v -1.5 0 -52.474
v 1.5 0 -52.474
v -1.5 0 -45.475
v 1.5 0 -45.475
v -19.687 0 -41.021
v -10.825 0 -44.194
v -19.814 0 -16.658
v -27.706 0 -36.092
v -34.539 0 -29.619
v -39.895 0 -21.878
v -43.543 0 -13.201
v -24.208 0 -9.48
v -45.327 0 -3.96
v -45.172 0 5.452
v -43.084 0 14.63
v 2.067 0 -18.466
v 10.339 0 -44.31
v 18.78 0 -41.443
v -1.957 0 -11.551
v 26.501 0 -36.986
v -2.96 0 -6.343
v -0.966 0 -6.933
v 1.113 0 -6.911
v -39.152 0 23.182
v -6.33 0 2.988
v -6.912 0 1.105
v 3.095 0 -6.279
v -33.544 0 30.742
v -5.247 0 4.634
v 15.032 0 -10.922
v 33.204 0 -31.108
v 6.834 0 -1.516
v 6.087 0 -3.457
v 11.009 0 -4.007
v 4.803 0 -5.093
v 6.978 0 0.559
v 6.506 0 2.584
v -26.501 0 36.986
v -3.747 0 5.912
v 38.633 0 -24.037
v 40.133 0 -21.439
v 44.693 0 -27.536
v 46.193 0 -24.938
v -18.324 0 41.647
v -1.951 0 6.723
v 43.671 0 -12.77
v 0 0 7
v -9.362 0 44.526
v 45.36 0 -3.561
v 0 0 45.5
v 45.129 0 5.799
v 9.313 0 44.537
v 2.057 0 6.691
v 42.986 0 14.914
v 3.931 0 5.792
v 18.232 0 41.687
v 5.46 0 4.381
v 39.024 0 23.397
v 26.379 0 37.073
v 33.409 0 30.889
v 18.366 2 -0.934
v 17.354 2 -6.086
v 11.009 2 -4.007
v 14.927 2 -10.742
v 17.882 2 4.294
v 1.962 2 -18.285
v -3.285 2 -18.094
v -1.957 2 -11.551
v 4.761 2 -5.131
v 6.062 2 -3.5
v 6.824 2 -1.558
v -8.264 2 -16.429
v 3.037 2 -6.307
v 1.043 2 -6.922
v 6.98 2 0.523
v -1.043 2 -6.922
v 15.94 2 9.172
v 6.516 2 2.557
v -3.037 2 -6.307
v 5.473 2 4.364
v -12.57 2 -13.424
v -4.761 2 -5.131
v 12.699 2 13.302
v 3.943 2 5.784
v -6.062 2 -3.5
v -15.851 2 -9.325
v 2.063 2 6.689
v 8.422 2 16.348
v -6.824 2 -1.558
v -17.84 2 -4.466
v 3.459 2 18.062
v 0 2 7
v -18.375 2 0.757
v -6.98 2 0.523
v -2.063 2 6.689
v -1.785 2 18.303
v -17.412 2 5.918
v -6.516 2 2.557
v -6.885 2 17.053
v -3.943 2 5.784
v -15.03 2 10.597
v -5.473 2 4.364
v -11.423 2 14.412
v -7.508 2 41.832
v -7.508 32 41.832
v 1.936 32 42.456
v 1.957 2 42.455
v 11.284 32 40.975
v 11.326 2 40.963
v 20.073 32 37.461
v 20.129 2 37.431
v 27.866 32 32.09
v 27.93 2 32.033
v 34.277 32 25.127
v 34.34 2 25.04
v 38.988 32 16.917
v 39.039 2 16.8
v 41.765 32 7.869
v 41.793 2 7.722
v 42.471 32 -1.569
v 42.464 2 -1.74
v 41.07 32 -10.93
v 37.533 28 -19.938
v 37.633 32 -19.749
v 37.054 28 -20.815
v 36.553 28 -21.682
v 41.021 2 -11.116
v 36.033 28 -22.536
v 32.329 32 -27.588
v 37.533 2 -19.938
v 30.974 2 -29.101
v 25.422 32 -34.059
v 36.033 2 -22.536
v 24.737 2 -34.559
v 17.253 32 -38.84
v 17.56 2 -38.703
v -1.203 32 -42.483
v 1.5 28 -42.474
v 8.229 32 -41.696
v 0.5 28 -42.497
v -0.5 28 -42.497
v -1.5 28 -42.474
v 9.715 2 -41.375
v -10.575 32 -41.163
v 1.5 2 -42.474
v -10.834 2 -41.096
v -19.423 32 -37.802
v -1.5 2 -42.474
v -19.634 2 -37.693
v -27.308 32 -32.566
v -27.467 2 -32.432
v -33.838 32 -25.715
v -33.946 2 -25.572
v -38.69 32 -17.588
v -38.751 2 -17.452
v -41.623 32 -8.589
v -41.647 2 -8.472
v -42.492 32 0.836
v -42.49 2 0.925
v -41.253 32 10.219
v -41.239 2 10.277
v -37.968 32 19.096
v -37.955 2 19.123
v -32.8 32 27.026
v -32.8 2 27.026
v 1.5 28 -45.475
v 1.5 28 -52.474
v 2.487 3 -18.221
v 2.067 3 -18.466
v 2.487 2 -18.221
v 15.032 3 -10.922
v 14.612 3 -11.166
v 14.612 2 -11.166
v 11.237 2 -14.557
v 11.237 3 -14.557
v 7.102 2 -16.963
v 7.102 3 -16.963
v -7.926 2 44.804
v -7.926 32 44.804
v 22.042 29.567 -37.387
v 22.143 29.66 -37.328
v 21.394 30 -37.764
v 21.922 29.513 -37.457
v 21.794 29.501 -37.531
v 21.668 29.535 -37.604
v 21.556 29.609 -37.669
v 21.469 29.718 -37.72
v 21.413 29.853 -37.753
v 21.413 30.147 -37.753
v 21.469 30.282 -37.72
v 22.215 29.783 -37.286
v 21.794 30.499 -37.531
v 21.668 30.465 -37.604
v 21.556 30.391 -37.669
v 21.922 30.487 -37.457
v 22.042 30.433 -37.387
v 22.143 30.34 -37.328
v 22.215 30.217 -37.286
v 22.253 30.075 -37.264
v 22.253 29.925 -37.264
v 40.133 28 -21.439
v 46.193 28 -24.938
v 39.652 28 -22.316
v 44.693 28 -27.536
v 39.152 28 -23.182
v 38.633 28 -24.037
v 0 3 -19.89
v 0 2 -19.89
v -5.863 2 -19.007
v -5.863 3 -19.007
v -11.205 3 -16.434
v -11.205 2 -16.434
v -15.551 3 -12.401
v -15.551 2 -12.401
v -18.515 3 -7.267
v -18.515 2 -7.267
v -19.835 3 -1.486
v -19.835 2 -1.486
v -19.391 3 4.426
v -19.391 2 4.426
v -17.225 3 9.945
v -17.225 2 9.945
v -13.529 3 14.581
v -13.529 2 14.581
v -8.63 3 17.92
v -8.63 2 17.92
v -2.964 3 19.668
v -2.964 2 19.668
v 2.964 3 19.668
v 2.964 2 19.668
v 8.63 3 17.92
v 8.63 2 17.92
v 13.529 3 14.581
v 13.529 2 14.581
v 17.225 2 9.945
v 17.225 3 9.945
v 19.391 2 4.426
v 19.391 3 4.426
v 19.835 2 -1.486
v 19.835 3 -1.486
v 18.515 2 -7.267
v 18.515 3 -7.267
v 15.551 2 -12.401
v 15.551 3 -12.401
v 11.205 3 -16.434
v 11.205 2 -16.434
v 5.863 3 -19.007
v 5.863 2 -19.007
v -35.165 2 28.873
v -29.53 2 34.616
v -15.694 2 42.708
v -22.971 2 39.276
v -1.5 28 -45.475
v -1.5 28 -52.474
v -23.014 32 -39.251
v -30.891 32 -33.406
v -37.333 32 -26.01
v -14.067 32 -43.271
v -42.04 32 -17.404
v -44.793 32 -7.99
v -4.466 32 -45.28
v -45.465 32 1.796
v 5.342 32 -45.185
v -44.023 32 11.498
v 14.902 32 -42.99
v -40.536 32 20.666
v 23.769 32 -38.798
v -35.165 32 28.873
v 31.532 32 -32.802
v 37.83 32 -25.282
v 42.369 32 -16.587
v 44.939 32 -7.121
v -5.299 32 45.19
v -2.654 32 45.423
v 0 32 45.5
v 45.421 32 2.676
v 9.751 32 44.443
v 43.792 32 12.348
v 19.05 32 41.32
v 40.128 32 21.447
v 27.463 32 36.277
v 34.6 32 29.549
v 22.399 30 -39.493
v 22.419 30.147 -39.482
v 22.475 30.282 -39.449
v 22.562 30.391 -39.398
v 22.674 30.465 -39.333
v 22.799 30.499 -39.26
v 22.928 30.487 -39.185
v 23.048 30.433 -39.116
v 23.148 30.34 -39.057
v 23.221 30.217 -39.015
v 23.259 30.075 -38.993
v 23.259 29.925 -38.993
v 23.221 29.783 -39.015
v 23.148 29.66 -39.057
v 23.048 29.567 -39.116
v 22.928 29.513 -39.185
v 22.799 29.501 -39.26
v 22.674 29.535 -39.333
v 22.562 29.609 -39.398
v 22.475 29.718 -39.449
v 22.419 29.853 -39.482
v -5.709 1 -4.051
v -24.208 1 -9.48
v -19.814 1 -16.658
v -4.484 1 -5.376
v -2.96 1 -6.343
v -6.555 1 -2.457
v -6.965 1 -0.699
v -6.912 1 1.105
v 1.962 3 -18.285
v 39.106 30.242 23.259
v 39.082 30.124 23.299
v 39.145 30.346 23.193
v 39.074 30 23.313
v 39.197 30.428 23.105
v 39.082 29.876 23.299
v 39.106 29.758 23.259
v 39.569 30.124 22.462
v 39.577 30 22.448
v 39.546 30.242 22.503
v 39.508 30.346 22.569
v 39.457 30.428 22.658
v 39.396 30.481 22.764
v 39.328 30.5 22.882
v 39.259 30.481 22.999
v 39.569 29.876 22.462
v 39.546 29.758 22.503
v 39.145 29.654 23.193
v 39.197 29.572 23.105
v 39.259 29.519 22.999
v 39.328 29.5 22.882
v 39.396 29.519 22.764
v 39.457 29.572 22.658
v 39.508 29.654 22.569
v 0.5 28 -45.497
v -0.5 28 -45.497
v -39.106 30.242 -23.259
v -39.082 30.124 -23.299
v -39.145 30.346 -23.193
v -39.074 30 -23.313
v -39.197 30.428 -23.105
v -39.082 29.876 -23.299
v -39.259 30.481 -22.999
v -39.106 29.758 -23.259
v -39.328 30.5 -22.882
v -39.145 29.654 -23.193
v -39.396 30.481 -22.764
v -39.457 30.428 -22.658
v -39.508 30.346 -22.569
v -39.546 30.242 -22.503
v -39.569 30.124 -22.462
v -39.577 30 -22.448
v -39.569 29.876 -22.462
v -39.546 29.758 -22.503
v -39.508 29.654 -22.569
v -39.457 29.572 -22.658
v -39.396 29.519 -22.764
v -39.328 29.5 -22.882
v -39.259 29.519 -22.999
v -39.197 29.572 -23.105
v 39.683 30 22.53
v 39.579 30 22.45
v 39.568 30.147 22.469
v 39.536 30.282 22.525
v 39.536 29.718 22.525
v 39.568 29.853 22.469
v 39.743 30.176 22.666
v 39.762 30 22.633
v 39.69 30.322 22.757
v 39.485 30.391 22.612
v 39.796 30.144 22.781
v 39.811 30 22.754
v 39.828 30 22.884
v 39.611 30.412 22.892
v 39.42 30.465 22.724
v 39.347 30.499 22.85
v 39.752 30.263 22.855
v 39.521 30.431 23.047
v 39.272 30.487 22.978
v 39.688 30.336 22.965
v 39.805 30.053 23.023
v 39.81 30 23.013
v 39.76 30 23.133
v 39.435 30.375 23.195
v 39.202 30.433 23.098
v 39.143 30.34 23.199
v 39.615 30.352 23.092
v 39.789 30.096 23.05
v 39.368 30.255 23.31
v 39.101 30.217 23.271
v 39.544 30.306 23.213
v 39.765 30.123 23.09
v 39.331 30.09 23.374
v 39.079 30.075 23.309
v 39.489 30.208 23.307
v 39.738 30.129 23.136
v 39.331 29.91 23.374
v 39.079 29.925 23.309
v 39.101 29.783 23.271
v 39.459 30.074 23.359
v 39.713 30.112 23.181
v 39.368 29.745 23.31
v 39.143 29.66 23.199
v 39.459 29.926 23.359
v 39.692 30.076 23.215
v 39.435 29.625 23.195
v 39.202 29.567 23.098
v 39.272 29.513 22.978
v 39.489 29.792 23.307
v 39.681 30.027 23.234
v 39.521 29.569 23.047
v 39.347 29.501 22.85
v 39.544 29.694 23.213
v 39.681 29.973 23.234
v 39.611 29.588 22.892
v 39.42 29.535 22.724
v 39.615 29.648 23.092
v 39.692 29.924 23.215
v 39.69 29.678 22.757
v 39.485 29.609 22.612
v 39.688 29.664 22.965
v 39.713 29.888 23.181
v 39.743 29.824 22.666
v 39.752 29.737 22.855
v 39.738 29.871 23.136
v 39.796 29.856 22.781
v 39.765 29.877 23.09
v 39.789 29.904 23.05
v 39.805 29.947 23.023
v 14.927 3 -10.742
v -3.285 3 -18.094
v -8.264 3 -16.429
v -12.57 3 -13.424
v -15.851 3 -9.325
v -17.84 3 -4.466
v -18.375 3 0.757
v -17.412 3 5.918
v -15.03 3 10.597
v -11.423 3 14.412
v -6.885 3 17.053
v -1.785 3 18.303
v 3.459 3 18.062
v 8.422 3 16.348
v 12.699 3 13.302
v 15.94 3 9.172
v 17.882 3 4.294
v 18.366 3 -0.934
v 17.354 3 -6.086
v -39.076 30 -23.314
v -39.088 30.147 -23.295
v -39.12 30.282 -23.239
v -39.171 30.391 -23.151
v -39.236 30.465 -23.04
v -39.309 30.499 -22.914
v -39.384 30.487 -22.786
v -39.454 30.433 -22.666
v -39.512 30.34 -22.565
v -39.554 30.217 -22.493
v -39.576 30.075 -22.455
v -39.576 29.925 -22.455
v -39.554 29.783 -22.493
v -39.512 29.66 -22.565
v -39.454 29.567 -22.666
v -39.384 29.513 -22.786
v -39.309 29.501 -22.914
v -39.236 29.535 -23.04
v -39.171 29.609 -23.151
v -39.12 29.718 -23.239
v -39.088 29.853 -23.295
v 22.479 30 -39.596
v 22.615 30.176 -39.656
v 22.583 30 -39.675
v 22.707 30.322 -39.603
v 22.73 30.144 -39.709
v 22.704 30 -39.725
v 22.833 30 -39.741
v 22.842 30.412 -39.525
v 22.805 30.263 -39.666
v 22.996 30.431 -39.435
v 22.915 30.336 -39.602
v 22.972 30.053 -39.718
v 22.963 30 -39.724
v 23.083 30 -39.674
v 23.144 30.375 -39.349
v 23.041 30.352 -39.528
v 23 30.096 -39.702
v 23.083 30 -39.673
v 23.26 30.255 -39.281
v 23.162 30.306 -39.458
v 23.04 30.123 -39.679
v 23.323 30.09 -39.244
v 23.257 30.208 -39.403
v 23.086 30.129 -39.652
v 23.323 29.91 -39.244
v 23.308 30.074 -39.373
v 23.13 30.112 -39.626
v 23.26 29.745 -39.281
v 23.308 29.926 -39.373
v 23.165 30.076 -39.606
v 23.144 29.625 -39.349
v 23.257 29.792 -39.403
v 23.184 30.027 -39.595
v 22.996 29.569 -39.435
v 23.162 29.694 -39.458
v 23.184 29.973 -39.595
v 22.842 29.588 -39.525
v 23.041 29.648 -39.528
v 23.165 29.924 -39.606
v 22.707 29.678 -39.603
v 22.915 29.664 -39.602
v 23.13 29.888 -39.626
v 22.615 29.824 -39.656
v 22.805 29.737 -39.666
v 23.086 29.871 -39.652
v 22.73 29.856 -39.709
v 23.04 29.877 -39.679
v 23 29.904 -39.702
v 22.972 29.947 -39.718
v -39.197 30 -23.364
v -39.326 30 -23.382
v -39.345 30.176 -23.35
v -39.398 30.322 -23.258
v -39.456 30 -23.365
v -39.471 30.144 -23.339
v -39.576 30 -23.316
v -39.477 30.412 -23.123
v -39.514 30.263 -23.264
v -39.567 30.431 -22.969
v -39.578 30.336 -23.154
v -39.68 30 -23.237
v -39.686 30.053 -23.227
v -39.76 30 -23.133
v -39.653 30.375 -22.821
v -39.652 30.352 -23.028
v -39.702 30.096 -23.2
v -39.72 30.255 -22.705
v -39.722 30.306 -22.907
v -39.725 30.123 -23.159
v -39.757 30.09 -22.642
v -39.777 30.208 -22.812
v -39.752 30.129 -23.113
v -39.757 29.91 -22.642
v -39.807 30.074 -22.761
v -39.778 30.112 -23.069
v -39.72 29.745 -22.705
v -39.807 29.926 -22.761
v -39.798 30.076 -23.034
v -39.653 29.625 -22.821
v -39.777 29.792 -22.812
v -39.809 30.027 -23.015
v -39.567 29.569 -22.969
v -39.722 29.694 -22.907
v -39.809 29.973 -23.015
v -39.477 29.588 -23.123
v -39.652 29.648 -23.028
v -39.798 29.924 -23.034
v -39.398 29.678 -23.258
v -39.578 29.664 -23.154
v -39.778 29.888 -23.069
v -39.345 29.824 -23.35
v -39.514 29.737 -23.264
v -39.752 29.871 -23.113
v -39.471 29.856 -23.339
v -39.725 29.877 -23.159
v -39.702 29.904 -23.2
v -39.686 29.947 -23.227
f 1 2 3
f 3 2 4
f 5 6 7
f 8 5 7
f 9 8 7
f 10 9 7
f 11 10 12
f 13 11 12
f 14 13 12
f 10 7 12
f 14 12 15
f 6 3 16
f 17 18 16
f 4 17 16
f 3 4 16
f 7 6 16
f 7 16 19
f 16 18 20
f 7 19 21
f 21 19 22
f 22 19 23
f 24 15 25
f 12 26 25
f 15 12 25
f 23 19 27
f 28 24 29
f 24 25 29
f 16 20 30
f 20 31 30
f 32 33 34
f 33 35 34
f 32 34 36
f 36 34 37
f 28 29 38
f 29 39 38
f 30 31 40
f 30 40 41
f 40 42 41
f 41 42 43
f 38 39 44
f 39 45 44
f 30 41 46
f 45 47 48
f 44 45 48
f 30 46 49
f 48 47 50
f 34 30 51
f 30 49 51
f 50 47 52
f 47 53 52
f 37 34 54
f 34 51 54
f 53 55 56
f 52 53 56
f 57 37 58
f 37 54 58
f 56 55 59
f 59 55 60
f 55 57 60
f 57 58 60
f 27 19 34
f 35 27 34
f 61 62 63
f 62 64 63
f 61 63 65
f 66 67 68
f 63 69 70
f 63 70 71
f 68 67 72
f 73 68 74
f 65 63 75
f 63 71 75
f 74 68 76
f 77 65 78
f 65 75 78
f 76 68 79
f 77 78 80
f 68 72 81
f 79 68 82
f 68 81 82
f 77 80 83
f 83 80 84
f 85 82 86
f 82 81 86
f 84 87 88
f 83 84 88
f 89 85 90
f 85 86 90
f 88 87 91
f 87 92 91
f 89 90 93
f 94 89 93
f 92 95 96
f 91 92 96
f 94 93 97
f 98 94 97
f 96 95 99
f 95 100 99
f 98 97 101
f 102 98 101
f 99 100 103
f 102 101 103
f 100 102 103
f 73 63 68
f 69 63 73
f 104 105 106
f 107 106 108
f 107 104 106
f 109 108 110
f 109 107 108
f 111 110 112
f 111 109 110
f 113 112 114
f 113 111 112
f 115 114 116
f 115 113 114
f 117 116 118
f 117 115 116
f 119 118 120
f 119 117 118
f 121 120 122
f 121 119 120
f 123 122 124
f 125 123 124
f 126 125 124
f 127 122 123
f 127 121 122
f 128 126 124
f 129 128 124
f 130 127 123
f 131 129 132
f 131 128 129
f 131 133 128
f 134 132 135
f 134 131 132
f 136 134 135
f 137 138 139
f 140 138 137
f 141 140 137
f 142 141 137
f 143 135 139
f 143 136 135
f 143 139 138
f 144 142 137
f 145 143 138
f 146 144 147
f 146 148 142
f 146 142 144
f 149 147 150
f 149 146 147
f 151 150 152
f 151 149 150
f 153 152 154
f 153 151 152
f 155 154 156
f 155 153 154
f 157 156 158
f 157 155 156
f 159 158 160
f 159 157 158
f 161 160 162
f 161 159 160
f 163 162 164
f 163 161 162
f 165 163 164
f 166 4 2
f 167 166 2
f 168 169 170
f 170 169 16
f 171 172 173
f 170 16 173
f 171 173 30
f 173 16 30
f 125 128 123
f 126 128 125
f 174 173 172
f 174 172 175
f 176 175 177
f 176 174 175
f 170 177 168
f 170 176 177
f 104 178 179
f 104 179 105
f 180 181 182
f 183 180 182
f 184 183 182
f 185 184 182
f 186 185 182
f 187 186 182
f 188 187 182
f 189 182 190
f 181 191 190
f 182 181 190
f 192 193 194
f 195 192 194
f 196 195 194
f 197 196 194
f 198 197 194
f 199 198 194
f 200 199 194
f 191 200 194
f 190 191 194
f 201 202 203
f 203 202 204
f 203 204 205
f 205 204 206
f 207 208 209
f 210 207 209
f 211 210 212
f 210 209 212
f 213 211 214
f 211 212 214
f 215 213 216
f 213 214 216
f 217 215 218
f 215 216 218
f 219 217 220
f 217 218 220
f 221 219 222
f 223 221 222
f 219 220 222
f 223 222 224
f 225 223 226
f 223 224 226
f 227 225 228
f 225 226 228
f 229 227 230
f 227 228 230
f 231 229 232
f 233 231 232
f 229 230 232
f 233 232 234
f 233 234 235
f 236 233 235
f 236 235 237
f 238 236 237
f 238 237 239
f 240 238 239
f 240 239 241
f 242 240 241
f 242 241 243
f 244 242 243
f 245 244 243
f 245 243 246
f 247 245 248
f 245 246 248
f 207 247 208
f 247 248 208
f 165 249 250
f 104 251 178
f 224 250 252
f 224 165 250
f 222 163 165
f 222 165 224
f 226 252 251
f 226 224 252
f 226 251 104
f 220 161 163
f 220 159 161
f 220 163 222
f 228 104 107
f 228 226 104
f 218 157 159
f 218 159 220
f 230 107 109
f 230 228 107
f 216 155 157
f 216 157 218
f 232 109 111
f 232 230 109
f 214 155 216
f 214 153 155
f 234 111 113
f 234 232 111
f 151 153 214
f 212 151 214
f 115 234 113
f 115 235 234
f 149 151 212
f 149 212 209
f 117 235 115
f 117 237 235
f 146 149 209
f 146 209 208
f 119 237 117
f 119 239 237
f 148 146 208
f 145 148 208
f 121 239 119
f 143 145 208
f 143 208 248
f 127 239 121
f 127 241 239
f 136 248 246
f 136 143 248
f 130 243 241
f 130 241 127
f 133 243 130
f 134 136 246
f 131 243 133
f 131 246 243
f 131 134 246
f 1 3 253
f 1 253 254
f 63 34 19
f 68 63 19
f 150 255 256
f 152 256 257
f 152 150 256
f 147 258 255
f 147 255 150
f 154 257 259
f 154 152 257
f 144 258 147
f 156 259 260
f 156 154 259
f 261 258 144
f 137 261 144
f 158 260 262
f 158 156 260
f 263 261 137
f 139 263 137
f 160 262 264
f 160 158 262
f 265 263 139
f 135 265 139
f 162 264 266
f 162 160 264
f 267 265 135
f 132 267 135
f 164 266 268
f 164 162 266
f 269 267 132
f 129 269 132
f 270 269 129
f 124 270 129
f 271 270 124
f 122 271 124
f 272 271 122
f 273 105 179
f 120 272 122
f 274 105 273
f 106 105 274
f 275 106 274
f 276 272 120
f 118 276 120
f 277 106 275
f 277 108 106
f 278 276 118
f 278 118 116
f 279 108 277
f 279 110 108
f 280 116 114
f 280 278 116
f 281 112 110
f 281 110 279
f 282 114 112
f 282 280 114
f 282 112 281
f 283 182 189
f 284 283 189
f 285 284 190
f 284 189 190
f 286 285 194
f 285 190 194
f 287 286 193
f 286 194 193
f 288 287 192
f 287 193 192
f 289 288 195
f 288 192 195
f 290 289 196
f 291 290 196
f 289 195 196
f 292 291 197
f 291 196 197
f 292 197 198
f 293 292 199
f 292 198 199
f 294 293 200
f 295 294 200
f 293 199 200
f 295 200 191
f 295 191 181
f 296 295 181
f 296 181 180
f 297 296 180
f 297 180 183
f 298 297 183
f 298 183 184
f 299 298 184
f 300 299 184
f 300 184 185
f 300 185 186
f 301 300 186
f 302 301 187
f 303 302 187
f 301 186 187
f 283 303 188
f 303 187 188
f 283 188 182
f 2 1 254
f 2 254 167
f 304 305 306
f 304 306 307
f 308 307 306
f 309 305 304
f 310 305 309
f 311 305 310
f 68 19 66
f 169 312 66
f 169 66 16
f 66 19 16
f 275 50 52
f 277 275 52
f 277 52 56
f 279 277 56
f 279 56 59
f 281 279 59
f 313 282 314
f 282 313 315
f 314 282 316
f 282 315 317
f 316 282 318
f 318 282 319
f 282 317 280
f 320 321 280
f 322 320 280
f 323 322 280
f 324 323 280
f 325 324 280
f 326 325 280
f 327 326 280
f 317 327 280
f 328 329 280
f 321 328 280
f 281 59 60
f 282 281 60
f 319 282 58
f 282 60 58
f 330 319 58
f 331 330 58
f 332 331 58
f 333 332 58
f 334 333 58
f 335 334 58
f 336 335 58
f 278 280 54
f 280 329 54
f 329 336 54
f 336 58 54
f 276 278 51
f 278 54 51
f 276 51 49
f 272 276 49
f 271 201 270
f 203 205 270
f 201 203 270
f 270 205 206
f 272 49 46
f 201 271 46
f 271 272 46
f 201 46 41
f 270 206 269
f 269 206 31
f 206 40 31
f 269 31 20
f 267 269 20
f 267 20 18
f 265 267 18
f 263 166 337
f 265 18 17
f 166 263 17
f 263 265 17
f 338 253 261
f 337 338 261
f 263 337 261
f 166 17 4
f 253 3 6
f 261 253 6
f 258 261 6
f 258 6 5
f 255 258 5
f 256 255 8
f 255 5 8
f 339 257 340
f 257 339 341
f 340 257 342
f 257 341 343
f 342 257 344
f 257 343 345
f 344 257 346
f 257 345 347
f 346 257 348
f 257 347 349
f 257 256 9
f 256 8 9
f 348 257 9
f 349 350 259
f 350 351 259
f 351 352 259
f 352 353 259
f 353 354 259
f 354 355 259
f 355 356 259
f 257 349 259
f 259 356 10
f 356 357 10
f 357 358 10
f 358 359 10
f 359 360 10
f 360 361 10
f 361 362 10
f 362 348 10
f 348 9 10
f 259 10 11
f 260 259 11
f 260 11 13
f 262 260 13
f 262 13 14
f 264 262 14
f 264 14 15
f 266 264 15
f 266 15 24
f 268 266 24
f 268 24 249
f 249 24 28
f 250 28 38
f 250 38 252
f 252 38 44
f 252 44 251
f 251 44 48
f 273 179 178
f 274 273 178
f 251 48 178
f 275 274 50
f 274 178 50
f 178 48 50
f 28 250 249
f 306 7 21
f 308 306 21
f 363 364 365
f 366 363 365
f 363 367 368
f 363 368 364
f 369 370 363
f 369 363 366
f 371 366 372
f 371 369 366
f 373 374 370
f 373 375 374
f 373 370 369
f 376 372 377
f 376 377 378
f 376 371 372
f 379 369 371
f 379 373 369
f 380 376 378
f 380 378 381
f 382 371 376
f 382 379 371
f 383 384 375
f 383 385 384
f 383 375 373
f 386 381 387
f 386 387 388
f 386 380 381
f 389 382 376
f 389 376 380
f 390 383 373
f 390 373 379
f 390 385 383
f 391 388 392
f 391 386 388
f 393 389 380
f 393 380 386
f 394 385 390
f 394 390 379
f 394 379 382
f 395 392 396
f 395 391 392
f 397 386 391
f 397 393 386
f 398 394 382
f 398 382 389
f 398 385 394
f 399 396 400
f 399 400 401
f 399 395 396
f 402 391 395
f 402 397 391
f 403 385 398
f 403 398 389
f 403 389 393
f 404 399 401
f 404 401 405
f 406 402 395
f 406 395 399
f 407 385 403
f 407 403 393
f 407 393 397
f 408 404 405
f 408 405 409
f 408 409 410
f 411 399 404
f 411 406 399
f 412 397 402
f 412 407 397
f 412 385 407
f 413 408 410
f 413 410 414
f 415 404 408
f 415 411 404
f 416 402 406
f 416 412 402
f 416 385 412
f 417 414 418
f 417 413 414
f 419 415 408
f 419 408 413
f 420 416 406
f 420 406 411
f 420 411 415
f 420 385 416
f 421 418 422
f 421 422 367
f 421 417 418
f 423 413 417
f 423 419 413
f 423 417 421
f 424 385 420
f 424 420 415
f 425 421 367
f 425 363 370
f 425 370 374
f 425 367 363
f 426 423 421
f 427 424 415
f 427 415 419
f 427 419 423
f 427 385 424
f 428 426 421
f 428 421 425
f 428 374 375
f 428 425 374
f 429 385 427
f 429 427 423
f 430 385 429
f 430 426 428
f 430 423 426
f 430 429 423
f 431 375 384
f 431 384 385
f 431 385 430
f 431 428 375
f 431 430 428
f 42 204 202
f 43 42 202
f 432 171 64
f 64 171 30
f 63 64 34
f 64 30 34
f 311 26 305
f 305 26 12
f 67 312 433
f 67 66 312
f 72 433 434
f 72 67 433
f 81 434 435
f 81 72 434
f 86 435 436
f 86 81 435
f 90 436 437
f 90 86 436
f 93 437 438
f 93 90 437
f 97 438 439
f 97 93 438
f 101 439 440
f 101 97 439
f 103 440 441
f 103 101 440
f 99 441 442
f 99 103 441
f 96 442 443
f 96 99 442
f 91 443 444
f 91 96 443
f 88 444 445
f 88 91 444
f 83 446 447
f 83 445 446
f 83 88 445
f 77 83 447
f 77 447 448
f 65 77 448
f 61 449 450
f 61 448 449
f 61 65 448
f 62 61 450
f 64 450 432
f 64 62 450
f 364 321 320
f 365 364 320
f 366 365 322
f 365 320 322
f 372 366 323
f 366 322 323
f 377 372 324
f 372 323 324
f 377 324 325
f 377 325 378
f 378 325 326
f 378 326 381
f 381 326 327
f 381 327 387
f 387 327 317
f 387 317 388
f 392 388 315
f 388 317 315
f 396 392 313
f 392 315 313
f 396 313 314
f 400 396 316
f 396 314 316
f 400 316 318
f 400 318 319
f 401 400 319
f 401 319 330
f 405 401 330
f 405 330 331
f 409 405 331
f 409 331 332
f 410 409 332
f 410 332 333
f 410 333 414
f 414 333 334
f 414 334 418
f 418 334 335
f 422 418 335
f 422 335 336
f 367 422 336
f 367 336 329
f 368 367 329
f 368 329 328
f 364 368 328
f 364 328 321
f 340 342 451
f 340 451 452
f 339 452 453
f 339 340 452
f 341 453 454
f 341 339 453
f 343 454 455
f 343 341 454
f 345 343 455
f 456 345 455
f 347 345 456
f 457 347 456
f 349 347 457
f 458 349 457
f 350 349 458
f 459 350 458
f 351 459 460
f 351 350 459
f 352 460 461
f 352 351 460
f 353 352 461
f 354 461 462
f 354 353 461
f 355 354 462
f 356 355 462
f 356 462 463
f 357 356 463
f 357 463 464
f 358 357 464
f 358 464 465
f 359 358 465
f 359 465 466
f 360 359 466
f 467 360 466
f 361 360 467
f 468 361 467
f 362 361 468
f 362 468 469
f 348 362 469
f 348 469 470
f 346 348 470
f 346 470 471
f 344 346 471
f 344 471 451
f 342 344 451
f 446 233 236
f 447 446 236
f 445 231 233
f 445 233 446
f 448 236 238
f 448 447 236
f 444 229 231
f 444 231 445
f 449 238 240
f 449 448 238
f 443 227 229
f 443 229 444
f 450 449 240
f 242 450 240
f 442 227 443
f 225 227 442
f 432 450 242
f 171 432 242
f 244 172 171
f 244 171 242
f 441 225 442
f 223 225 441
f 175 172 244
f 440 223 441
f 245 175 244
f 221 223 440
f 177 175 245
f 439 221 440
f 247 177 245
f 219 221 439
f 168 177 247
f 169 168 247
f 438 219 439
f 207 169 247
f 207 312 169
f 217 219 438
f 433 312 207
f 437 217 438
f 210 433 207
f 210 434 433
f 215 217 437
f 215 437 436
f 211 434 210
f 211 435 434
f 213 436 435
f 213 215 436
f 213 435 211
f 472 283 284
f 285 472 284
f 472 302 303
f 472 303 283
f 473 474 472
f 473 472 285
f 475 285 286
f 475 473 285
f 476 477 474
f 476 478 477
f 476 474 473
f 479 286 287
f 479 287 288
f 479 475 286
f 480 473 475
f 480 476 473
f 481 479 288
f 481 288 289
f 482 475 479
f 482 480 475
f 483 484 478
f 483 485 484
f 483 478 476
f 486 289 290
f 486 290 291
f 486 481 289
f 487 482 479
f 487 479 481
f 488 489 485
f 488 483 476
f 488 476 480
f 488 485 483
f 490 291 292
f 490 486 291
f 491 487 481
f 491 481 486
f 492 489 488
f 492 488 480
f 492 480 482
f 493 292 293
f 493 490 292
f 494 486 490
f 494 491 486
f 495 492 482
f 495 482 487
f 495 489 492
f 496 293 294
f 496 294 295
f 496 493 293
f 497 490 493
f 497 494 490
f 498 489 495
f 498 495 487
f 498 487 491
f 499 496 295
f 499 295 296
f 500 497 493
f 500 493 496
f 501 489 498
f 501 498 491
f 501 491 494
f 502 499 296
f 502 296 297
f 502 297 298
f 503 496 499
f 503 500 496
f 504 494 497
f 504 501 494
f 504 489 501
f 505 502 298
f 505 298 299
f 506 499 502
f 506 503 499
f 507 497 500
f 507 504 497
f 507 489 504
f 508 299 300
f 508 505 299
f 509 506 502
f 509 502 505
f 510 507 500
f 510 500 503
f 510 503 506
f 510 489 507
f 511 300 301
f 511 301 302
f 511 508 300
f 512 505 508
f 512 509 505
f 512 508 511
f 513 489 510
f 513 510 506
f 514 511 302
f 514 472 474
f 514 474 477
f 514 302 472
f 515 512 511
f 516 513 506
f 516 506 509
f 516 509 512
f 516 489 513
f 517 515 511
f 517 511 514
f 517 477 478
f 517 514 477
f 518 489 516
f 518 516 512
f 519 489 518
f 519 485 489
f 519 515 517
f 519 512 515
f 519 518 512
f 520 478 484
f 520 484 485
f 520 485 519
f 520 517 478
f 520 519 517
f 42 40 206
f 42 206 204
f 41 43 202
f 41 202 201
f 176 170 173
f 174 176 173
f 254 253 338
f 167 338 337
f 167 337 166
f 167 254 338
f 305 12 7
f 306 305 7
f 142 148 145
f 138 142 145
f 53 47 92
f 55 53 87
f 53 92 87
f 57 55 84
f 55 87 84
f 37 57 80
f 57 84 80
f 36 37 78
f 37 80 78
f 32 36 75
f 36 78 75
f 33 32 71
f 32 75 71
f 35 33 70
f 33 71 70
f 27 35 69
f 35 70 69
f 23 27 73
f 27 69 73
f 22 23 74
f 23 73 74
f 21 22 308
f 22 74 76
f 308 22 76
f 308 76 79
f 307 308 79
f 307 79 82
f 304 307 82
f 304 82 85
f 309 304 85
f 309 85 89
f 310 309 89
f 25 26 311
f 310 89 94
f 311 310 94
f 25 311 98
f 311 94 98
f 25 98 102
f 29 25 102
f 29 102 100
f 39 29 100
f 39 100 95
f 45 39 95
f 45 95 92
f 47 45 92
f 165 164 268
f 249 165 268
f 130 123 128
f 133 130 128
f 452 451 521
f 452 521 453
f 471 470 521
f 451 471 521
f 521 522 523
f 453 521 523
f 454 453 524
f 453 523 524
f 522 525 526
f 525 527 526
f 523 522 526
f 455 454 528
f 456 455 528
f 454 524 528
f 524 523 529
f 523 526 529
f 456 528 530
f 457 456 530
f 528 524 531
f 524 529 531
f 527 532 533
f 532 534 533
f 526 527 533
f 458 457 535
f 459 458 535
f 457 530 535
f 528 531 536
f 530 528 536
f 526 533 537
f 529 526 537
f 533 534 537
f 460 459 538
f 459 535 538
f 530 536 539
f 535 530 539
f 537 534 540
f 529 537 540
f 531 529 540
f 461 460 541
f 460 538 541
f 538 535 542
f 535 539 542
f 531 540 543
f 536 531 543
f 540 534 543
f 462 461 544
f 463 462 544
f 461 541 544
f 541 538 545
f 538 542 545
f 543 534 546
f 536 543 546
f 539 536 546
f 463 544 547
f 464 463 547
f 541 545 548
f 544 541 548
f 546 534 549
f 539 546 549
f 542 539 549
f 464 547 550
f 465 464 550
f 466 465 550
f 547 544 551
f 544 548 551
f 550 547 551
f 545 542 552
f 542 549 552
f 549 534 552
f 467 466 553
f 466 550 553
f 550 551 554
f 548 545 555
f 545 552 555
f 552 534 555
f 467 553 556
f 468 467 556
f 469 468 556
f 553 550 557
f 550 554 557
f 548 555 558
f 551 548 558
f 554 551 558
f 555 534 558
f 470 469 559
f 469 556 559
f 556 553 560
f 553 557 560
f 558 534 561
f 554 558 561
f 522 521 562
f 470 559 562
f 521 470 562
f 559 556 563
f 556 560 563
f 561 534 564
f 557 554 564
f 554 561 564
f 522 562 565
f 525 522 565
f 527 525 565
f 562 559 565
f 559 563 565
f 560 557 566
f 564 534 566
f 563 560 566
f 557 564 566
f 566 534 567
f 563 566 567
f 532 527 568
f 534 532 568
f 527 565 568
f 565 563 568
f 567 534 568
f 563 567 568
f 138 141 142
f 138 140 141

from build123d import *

# Parameters (mm, degrees)
SKETCH1_R                = 45.5
SKETCH1_R_2              = 42.5
BOSS_EXTRUDE1_DEPTH      = 32
SKETCH2_R                = 45.5
BOSS_EXTRUDE2_DEPTH      = 2
SKETCH3_R                = 7
CUT_EXTRUDE1_DEPTH       = 2
BOSS_EXTRUDE4_DEPTH      = 26
BOSS_EXTRUDE4_DEPTH_BACK = 2
SKETCH7_W                = 3
SKETCH7_H                = 10
SKETCH8_R                = 19.890165718
SKETCH8_R_2              = 18.390165718
BOSS_EXTRUDE5_DEPTH      = 1
CUT_EXTRUDE4_DEPTH       = 5.5
CUT_EXTRUDE5_DEPTH       = 58.5
CUT_EXTRUDE6_DEPTH       = 1
BOSS_EXTRUDE6_DEPTH      = 0.5
BOSS_EXTRUDE6_DEPTH_BACK = 2
SKETCH13_R               = 0.5
FILLET1_R                = 0.5
BOSS_EXTRUDE7_START      = -2
SKETCH23_R               = 0.5
BOSS_EXTRUDE7_DEPTH      = 2.5
FILLET2_R                = 0.5
FILLET2_OF_MIRROR1_R     = 0.5


with BuildPart() as part:
    # Sketch1 → Boss-Extrude1 (new body)
    with BuildSketch(Plane(origin=(0, 0, 0), x_dir=(1, 0, 0), z_dir=(0, 1, 0))):
        with Locations(Location((0, 0, 0), (0, 0, 270))):
            Circle(SKETCH1_R)
        with Locations(Location((0, 0, 0), (0, 0, 270))):
            Circle(SKETCH1_R_2, mode=Mode.SUBTRACT)
    extrude(amount=BOSS_EXTRUDE1_DEPTH)

    # Sketch2 → Boss-Extrude2 (add)
    with BuildSketch(Plane.XZ):
        with Locations(Location((0, 0, 0), (0, 0, 90))):
            Circle(SKETCH2_R)
    extrude(amount=-BOSS_EXTRUDE2_DEPTH)

    # Sketch3 → Cut-Extrude1 (cut)
    with BuildSketch(Plane(origin=(0, 2, 0), x_dir=(1, 0, 0), z_dir=(0, 1, 0))):
        with Locations(Location((0, 0, 0), (0, 0, 270))):
            Circle(SKETCH3_R)
    extrude(amount=-CUT_EXTRUDE1_DEPTH, mode=Mode.SUBTRACT)

    # Sketch7 → Boss-Extrude4 (add, two sides: drawn at the far end of the back side and taken through both)
    with BuildSketch(Plane(origin=(0, 2, 0), x_dir=(1, 0, 0), z_dir=(0, 1, 0)).offset(-BOSS_EXTRUDE4_DEPTH_BACK)):
        with Locations((0, 47.473521163)):
            Rectangle(SKETCH7_W, SKETCH7_H)
        Polygon((46.193402353, 24.937722476), (37.533148315, 19.937722476), (36.033148315, 22.535798687), (44.693402353, 27.535798687), align=None)
    extrude(amount=BOSS_EXTRUDE4_DEPTH + BOSS_EXTRUDE4_DEPTH_BACK)

    # Sketch8 → Boss-Extrude5 (add)
    with BuildSketch(Plane(origin=(0, 2, 0), x_dir=(1, 0, 0), z_dir=(0, 1, 0))):
        with Locations(Location((0, 0, 0), (0, 0, 90))):
            Circle(SKETCH8_R)
        with Locations(Location((0, 0, 0), (0, 0, 270))):
            Circle(SKETCH8_R_2, mode=Mode.SUBTRACT)
    extrude(amount=BOSS_EXTRUDE5_DEPTH)

    # Sketch10 → Cut-Extrude4 (cut)
    with BuildSketch(Plane.XZ):
        Polygon((2.06668842, -18.465611254), (15.0318685, -10.92213026), (11.008678636, -4.007367551), (-1.956501443, -11.550848545), align=None)
    extrude(amount=-CUT_EXTRUDE4_DEPTH, mode=Mode.SUBTRACT)

    # Sketch11 → Cut-Extrude5 (cut)
    with BuildSketch(Plane(origin=(0, 2, 0), x_dir=(1, 0, 0), z_dir=(0, 1, 0))):
        Polygon((-32.606600292, -26.874098434), (-35.165226496, -28.87311631), (-33.824988888, -37.754161376), (-11.7382848, -48.772412552), (-7.925983096, -44.804338986), (-7.495155029, -41.738838001), (-9.978475631, -35.419229659), (-25.965270809, -26.874098434), align=None)
    extrude(amount=CUT_EXTRUDE5_DEPTH, mode=Mode.SUBTRACT)

    # Sketch12 → Cut-Extrude6 (cut)
    with BuildSketch(Plane.XZ):
        Polygon((-6.912265346, 1.104802147), (-24.20763883, -9.480307189), (-19.814483018, -16.658435267), (-2.519109534, -6.073325931), align=None)
    extrude(amount=-CUT_EXTRUDE6_DEPTH, mode=Mode.SUBTRACT)

    # Sketch23 → Boss-Extrude7 (add)
    with BuildSketch(Plane(origin=(39.327712908, 0, 22.881892348), x_dir=(0.5028987329328956, 0, -0.8643453386317811), z_dir=(0.8643453386317811, 0, 0.5028987329328956)).offset(BOSS_EXTRUDE7_START)):
        with Locations((0, 30)):
            Circle(SKETCH23_R)
    boss_extrude7 = extrude(amount=BOSS_EXTRUDE7_DEPTH)

    # Fillet2
    fillet2_edges = [part.edges().sort_by_distance(p)[0] for p in [
        (39.508436211, 30, 23.565514384),
    ]]
    fillet(fillet2_edges, radius=FILLET2_R - 0.0001)  # a hair under: the kernel refuses the full size

    # Mirror1: Boss-Extrude7 across plane
    add(boss_extrude7.mirror(Plane(origin=(0, 0, 0), x_dir=(-0.5028987329328956, 0, 0.864345338631781), z_dir=(0.8643453386317811, 0, 0.5028987329328956))))

    # Fillet2 of Mirror1
    fillet2_of_mirror1_edges = [part.edges().sort_by_distance(p)[0] for p in [
        (-40.011334944, 30, -22.701169046),
    ]]
    fillet(fillet2_of_mirror1_edges, radius=FILLET2_OF_MIRROR1_R - 0.0001)  # a hair under: the kernel refuses the full size


with BuildPart() as body_2:
    # Sketch13 → Boss-Extrude6 (new, two sides: drawn at the far end of the back side and taken through both)
    with BuildSketch(Plane(origin=(22.831602475, 0, -39.241278374), x_dir=(-0.8643453386317811, 0, -0.5028987329328956), z_dir=(0.5028987329328954, 0, -0.864345338631781)).offset(-BOSS_EXTRUDE6_DEPTH_BACK)):
        with Locations((0, 30)):
            Circle(SKETCH13_R)
    extrude(amount=BOSS_EXTRUDE6_DEPTH + BOSS_EXTRUDE6_DEPTH_BACK)

    # Fillet1
    fillet1_edges = [body_2.edges().sort_by_distance(p)[0] for p in [
        (23.515224511, 30, -39.422001677),
    ]]
    fillet(fillet1_edges, radius=FILLET1_R - 0.0001)  # a hair under: the kernel refuses the full size


solid = Compound([part.part, body_2.part])
